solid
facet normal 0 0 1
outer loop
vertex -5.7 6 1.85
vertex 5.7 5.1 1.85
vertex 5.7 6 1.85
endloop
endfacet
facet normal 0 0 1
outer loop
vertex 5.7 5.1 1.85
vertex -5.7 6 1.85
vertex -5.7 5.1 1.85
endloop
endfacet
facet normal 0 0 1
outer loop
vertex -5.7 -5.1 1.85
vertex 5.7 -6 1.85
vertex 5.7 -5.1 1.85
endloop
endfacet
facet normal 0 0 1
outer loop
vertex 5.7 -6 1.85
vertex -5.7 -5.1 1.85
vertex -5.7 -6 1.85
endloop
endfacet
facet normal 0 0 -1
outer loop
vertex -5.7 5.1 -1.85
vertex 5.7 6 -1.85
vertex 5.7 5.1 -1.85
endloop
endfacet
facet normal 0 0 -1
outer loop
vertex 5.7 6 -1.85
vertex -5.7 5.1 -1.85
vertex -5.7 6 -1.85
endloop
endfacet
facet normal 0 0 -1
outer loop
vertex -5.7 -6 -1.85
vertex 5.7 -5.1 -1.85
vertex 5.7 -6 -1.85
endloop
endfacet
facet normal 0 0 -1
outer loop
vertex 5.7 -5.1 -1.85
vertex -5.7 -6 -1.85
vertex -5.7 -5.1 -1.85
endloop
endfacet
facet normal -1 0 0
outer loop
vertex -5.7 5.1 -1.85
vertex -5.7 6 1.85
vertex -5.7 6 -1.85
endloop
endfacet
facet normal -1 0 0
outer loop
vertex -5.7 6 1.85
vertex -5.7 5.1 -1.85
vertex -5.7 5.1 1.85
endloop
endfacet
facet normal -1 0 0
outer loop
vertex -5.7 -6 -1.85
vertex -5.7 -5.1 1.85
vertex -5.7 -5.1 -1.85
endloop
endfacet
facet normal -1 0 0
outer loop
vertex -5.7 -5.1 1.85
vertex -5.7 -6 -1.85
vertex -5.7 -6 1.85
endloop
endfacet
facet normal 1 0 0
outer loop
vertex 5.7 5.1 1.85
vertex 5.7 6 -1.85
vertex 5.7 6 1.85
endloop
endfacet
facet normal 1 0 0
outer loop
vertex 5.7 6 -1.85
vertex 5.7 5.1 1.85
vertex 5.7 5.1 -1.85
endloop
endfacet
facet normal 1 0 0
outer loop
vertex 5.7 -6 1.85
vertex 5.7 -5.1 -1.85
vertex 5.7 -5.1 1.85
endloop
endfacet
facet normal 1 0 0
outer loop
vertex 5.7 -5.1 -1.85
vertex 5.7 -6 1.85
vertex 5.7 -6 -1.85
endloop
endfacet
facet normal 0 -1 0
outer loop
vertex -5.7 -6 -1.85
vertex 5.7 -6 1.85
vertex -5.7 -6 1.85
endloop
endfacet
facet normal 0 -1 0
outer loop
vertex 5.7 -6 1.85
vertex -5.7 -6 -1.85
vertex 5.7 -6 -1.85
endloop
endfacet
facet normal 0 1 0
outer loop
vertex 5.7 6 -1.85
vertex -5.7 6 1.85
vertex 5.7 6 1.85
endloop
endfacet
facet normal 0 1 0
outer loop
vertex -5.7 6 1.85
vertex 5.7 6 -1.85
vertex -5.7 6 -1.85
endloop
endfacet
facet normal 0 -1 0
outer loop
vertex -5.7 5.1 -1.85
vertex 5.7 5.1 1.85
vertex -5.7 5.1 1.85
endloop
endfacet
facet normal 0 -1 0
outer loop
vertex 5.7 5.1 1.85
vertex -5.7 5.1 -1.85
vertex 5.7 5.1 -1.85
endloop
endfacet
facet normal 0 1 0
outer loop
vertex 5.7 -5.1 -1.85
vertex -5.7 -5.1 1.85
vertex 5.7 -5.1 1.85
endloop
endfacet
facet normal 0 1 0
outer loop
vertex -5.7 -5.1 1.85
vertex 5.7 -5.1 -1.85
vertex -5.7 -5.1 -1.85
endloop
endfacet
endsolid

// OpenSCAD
// T-slot nut (single connected solid)
// Target: 4.0mm screw clearance, 6.0mm across flats hex pocket, 3.7mm thick

// ---------------- Parameters ----------------
screw_thread_diameter_mm = 4.0;          //[2.0:8.0:0.1]
across_flats_mm          = 6.0;          //[3.0:12.0:0.1]
thickness_mm             = 3.7;          //[1.85:7.4:0.1]

// Typical compact T-nut envelope (editable)
body_length_mm           = 12.0;         //[6.0:24.0:0.5]   // along slot
slot_neck_width_mm       = 6.2;          //[3.0:12.0:0.1]   // narrow opening of slot
slot_inner_width_mm      = 10.2;         //[5.0:20.0:0.1]   // wider cavity under lips
slot_lip_thickness_mm    = 1.2;          //[0.6:2.4:0.1]    // thickness of each lip (per side)
retention_shoulder_height_mm = 0.8;      //[0.4:1.6:0.1]    // height of the undercut region (from each face)

manufacturing_allowance_mm = 0.10;       //[0.0:0.5:0.05]
threaded_hole_clearance_factor = 1.05;  //[1.0:1.2:0.01]

chamfer_mm               = 0.30;         //[0.1:1.0:0.05]
overlap_mm               = 1.20;         //[0.5:2.0:0.1]  // use 1-2mm overlap for robust connectivity

$fn = 96;

// ---------------- Derived ----------------
body_width_mm = slot_inner_width_mm + 2*slot_lip_thickness_mm; // overall width across lips

hole_r = (screw_thread_diameter_mm*threaded_hole_clearance_factor + manufacturing_allowance_mm)/2;

// Hex circumradius for given across-flats (AF = 2*R*cos(30))
hex_R  = (across_flats_mm/2)/cos(30);

// Ensure the neck cut does NOT remove the lips entirely
slot_neck_width_eff_mm = min(slot_neck_width_mm, body_width_mm - 2*manufacturing_allowance_mm);

// Ensure undercut height is valid for given thickness
ret_h_eff_mm = min(retention_shoulder_height_mm, thickness_mm/2 - 0.05);

// ---------------- Helpers ----------------
module chamfer_ends_cut() {
    for (sx = [-1, 1]) {
        translate([sx*(body_length_mm/2 - chamfer_mm/2), 0, 0])
            cube([chamfer_mm, body_width_mm + 2*overlap_mm, thickness_mm + 2*overlap_mm], center=true);
    }
}

module chamfer_sides_cut() {
    for (sy = [-1, 1]) {
        translate([0, sy*(body_width_mm/2 - chamfer_mm/2), 0])
            cube([body_length_mm + 2*overlap_mm, chamfer_mm, thickness_mm + 2*overlap_mm], center=true);
    }
}

// ---------------- Main solid ----------------
module t_slot_nut() {

    // Build as a single connected solid (explicit union), then subtract cuts.
    // Add a tiny internal "web" so the two lips remain physically connected
    // (prevents the model from becoming two separate rectangular solids).
    difference() {
        union() {
            // Base block (overall envelope)
            cube([body_length_mm, body_width_mm, thickness_mm], center=true);

            // Internal connector web (keeps left/right lips connected after the neck cut)
            // Overlaps the base by design; small enough to not change the external design.
            web_w_mm = max(0.8, 2*manufacturing_allowance_mm + 0.4); // thin but printable
            cube([body_length_mm + overlap_mm, web_w_mm, thickness_mm], center=true);
        }

        // T-slot undercut pockets near both faces (leave lips at outer edges)
        translate([0, 0, +thickness_mm/2 - ret_h_eff_mm/2])
            cube([body_length_mm + 2*overlap_mm, slot_inner_width_mm, ret_h_eff_mm + 2*overlap_mm], center=true);

        translate([0, 0, -thickness_mm/2 + ret_h_eff_mm/2])
            cube([body_length_mm + 2*overlap_mm, slot_inner_width_mm, ret_h_eff_mm + 2*overlap_mm], center=true);

        // Central neck cut (runs full thickness) - narrower than overall width so lips remain
        // NOTE: The internal web above ensures the part stays one connected solid.
        cube([body_length_mm + 2*overlap_mm, slot_neck_width_eff_mm, thickness_mm + 2*overlap_mm], center=true);

        // Central screw clearance hole (4.0mm screw compatible)
        cylinder(h=thickness_mm + 2*overlap_mm, r=hole_r, center=true);

        // Hex pocket for 6.0mm across flats (nut capture), shallow so part stays connected
        hex_pocket_depth_mm = min(thickness_mm*0.60, thickness_mm - 0.6);
        translate([0, 0, +thickness_mm/2 - hex_pocket_depth_mm/2])
            cylinder(h=hex_pocket_depth_mm + 2*overlap_mm, r=hex_R, center=true, $fn=6);

        // Optional edge chamfers (cuts)
        chamfer_ends_cut();
        chamfer_sides_cut();
    }
}

t_slot_nut();
